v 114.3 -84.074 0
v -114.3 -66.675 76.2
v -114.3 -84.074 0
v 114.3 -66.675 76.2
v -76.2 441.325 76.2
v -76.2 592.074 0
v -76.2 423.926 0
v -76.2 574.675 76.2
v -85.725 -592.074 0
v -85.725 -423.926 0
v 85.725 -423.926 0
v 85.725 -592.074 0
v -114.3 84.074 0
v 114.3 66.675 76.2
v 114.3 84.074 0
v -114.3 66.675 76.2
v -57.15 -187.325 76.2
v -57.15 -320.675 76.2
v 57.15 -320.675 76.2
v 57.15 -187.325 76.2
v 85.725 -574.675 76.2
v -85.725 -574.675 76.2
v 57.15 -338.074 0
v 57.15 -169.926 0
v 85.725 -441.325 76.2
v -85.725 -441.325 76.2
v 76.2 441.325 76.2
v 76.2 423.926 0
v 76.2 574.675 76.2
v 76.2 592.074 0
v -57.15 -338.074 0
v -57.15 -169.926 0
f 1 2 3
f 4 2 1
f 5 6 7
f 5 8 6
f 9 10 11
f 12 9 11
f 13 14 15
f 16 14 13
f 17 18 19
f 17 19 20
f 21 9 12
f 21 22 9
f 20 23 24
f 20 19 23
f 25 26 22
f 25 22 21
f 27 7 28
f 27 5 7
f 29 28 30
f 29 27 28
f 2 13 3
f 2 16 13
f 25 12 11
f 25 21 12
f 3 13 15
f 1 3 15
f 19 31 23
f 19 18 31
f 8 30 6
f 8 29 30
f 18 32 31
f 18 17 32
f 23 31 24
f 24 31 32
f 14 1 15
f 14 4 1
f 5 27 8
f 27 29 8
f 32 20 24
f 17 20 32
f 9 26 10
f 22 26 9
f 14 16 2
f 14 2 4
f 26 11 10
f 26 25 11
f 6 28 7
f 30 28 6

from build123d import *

# Parameters (mm, degrees)
F0_W   = 228.6
F0_H   = 168.148
F2_W   = 228.6
F2_H   = 133.35
F0_W_2 = 114.3
F2_W_2 = 114.3
F0_W_3 = 171.45
F2_W_3 = 171.45


with BuildPart() as f3:
    # F0 (on Top) → F3 section 0
    with BuildSketch(Plane.XY):
        Rectangle(F0_W, F0_H)
    # F2 (on offset) → F3 section 1
    with BuildSketch(Plane.XY.offset(76.2)):
        Rectangle(F2_W, F2_H)
    loft()


with BuildPart() as f4:
    # F0 (on Top) → F4 section 0
    with BuildSketch(Plane.XY):
        with Locations((0, -254)):
            Rectangle(F0_W_2, F0_H)
    # F2 (on offset) → F4 section 1
    with BuildSketch(Plane.XY.offset(76.2)):
        with Locations((0, -254)):
            Rectangle(F2_W_2, F2_H)
    loft()


with BuildPart() as f5:
    # F0 (on Top) → F5 section 0
    with BuildSketch(Plane.XY):
        with Locations((0, -508)):
            Rectangle(F0_W_3, F0_H)
    # F2 (on offset) → F5 section 1
    with BuildSketch(Plane.XY.offset(76.2)):
        with Locations((0, -508)):
            Rectangle(F2_W_3, F2_H)
    loft()


with BuildPart() as f6:
    # F0 (on Top) → F6 section 0
    with BuildSketch(Plane.XY):
        Polygon((0, 423.926), (76.2, 423.926), (76.2, 592.074), (-76.2, 592.074), (-76.2, 423.926), align=None)
    # F2 (on offset) → F6 section 1
    with BuildSketch(Plane.XY.offset(76.2)):
        Polygon((0, 441.325), (76.2, 441.325), (76.2, 574.675), (-76.2, 574.675), (-76.2, 441.325), align=None)
    loft()


solid = Compound([f3.part, f4.part, f5.part, f6.part])
